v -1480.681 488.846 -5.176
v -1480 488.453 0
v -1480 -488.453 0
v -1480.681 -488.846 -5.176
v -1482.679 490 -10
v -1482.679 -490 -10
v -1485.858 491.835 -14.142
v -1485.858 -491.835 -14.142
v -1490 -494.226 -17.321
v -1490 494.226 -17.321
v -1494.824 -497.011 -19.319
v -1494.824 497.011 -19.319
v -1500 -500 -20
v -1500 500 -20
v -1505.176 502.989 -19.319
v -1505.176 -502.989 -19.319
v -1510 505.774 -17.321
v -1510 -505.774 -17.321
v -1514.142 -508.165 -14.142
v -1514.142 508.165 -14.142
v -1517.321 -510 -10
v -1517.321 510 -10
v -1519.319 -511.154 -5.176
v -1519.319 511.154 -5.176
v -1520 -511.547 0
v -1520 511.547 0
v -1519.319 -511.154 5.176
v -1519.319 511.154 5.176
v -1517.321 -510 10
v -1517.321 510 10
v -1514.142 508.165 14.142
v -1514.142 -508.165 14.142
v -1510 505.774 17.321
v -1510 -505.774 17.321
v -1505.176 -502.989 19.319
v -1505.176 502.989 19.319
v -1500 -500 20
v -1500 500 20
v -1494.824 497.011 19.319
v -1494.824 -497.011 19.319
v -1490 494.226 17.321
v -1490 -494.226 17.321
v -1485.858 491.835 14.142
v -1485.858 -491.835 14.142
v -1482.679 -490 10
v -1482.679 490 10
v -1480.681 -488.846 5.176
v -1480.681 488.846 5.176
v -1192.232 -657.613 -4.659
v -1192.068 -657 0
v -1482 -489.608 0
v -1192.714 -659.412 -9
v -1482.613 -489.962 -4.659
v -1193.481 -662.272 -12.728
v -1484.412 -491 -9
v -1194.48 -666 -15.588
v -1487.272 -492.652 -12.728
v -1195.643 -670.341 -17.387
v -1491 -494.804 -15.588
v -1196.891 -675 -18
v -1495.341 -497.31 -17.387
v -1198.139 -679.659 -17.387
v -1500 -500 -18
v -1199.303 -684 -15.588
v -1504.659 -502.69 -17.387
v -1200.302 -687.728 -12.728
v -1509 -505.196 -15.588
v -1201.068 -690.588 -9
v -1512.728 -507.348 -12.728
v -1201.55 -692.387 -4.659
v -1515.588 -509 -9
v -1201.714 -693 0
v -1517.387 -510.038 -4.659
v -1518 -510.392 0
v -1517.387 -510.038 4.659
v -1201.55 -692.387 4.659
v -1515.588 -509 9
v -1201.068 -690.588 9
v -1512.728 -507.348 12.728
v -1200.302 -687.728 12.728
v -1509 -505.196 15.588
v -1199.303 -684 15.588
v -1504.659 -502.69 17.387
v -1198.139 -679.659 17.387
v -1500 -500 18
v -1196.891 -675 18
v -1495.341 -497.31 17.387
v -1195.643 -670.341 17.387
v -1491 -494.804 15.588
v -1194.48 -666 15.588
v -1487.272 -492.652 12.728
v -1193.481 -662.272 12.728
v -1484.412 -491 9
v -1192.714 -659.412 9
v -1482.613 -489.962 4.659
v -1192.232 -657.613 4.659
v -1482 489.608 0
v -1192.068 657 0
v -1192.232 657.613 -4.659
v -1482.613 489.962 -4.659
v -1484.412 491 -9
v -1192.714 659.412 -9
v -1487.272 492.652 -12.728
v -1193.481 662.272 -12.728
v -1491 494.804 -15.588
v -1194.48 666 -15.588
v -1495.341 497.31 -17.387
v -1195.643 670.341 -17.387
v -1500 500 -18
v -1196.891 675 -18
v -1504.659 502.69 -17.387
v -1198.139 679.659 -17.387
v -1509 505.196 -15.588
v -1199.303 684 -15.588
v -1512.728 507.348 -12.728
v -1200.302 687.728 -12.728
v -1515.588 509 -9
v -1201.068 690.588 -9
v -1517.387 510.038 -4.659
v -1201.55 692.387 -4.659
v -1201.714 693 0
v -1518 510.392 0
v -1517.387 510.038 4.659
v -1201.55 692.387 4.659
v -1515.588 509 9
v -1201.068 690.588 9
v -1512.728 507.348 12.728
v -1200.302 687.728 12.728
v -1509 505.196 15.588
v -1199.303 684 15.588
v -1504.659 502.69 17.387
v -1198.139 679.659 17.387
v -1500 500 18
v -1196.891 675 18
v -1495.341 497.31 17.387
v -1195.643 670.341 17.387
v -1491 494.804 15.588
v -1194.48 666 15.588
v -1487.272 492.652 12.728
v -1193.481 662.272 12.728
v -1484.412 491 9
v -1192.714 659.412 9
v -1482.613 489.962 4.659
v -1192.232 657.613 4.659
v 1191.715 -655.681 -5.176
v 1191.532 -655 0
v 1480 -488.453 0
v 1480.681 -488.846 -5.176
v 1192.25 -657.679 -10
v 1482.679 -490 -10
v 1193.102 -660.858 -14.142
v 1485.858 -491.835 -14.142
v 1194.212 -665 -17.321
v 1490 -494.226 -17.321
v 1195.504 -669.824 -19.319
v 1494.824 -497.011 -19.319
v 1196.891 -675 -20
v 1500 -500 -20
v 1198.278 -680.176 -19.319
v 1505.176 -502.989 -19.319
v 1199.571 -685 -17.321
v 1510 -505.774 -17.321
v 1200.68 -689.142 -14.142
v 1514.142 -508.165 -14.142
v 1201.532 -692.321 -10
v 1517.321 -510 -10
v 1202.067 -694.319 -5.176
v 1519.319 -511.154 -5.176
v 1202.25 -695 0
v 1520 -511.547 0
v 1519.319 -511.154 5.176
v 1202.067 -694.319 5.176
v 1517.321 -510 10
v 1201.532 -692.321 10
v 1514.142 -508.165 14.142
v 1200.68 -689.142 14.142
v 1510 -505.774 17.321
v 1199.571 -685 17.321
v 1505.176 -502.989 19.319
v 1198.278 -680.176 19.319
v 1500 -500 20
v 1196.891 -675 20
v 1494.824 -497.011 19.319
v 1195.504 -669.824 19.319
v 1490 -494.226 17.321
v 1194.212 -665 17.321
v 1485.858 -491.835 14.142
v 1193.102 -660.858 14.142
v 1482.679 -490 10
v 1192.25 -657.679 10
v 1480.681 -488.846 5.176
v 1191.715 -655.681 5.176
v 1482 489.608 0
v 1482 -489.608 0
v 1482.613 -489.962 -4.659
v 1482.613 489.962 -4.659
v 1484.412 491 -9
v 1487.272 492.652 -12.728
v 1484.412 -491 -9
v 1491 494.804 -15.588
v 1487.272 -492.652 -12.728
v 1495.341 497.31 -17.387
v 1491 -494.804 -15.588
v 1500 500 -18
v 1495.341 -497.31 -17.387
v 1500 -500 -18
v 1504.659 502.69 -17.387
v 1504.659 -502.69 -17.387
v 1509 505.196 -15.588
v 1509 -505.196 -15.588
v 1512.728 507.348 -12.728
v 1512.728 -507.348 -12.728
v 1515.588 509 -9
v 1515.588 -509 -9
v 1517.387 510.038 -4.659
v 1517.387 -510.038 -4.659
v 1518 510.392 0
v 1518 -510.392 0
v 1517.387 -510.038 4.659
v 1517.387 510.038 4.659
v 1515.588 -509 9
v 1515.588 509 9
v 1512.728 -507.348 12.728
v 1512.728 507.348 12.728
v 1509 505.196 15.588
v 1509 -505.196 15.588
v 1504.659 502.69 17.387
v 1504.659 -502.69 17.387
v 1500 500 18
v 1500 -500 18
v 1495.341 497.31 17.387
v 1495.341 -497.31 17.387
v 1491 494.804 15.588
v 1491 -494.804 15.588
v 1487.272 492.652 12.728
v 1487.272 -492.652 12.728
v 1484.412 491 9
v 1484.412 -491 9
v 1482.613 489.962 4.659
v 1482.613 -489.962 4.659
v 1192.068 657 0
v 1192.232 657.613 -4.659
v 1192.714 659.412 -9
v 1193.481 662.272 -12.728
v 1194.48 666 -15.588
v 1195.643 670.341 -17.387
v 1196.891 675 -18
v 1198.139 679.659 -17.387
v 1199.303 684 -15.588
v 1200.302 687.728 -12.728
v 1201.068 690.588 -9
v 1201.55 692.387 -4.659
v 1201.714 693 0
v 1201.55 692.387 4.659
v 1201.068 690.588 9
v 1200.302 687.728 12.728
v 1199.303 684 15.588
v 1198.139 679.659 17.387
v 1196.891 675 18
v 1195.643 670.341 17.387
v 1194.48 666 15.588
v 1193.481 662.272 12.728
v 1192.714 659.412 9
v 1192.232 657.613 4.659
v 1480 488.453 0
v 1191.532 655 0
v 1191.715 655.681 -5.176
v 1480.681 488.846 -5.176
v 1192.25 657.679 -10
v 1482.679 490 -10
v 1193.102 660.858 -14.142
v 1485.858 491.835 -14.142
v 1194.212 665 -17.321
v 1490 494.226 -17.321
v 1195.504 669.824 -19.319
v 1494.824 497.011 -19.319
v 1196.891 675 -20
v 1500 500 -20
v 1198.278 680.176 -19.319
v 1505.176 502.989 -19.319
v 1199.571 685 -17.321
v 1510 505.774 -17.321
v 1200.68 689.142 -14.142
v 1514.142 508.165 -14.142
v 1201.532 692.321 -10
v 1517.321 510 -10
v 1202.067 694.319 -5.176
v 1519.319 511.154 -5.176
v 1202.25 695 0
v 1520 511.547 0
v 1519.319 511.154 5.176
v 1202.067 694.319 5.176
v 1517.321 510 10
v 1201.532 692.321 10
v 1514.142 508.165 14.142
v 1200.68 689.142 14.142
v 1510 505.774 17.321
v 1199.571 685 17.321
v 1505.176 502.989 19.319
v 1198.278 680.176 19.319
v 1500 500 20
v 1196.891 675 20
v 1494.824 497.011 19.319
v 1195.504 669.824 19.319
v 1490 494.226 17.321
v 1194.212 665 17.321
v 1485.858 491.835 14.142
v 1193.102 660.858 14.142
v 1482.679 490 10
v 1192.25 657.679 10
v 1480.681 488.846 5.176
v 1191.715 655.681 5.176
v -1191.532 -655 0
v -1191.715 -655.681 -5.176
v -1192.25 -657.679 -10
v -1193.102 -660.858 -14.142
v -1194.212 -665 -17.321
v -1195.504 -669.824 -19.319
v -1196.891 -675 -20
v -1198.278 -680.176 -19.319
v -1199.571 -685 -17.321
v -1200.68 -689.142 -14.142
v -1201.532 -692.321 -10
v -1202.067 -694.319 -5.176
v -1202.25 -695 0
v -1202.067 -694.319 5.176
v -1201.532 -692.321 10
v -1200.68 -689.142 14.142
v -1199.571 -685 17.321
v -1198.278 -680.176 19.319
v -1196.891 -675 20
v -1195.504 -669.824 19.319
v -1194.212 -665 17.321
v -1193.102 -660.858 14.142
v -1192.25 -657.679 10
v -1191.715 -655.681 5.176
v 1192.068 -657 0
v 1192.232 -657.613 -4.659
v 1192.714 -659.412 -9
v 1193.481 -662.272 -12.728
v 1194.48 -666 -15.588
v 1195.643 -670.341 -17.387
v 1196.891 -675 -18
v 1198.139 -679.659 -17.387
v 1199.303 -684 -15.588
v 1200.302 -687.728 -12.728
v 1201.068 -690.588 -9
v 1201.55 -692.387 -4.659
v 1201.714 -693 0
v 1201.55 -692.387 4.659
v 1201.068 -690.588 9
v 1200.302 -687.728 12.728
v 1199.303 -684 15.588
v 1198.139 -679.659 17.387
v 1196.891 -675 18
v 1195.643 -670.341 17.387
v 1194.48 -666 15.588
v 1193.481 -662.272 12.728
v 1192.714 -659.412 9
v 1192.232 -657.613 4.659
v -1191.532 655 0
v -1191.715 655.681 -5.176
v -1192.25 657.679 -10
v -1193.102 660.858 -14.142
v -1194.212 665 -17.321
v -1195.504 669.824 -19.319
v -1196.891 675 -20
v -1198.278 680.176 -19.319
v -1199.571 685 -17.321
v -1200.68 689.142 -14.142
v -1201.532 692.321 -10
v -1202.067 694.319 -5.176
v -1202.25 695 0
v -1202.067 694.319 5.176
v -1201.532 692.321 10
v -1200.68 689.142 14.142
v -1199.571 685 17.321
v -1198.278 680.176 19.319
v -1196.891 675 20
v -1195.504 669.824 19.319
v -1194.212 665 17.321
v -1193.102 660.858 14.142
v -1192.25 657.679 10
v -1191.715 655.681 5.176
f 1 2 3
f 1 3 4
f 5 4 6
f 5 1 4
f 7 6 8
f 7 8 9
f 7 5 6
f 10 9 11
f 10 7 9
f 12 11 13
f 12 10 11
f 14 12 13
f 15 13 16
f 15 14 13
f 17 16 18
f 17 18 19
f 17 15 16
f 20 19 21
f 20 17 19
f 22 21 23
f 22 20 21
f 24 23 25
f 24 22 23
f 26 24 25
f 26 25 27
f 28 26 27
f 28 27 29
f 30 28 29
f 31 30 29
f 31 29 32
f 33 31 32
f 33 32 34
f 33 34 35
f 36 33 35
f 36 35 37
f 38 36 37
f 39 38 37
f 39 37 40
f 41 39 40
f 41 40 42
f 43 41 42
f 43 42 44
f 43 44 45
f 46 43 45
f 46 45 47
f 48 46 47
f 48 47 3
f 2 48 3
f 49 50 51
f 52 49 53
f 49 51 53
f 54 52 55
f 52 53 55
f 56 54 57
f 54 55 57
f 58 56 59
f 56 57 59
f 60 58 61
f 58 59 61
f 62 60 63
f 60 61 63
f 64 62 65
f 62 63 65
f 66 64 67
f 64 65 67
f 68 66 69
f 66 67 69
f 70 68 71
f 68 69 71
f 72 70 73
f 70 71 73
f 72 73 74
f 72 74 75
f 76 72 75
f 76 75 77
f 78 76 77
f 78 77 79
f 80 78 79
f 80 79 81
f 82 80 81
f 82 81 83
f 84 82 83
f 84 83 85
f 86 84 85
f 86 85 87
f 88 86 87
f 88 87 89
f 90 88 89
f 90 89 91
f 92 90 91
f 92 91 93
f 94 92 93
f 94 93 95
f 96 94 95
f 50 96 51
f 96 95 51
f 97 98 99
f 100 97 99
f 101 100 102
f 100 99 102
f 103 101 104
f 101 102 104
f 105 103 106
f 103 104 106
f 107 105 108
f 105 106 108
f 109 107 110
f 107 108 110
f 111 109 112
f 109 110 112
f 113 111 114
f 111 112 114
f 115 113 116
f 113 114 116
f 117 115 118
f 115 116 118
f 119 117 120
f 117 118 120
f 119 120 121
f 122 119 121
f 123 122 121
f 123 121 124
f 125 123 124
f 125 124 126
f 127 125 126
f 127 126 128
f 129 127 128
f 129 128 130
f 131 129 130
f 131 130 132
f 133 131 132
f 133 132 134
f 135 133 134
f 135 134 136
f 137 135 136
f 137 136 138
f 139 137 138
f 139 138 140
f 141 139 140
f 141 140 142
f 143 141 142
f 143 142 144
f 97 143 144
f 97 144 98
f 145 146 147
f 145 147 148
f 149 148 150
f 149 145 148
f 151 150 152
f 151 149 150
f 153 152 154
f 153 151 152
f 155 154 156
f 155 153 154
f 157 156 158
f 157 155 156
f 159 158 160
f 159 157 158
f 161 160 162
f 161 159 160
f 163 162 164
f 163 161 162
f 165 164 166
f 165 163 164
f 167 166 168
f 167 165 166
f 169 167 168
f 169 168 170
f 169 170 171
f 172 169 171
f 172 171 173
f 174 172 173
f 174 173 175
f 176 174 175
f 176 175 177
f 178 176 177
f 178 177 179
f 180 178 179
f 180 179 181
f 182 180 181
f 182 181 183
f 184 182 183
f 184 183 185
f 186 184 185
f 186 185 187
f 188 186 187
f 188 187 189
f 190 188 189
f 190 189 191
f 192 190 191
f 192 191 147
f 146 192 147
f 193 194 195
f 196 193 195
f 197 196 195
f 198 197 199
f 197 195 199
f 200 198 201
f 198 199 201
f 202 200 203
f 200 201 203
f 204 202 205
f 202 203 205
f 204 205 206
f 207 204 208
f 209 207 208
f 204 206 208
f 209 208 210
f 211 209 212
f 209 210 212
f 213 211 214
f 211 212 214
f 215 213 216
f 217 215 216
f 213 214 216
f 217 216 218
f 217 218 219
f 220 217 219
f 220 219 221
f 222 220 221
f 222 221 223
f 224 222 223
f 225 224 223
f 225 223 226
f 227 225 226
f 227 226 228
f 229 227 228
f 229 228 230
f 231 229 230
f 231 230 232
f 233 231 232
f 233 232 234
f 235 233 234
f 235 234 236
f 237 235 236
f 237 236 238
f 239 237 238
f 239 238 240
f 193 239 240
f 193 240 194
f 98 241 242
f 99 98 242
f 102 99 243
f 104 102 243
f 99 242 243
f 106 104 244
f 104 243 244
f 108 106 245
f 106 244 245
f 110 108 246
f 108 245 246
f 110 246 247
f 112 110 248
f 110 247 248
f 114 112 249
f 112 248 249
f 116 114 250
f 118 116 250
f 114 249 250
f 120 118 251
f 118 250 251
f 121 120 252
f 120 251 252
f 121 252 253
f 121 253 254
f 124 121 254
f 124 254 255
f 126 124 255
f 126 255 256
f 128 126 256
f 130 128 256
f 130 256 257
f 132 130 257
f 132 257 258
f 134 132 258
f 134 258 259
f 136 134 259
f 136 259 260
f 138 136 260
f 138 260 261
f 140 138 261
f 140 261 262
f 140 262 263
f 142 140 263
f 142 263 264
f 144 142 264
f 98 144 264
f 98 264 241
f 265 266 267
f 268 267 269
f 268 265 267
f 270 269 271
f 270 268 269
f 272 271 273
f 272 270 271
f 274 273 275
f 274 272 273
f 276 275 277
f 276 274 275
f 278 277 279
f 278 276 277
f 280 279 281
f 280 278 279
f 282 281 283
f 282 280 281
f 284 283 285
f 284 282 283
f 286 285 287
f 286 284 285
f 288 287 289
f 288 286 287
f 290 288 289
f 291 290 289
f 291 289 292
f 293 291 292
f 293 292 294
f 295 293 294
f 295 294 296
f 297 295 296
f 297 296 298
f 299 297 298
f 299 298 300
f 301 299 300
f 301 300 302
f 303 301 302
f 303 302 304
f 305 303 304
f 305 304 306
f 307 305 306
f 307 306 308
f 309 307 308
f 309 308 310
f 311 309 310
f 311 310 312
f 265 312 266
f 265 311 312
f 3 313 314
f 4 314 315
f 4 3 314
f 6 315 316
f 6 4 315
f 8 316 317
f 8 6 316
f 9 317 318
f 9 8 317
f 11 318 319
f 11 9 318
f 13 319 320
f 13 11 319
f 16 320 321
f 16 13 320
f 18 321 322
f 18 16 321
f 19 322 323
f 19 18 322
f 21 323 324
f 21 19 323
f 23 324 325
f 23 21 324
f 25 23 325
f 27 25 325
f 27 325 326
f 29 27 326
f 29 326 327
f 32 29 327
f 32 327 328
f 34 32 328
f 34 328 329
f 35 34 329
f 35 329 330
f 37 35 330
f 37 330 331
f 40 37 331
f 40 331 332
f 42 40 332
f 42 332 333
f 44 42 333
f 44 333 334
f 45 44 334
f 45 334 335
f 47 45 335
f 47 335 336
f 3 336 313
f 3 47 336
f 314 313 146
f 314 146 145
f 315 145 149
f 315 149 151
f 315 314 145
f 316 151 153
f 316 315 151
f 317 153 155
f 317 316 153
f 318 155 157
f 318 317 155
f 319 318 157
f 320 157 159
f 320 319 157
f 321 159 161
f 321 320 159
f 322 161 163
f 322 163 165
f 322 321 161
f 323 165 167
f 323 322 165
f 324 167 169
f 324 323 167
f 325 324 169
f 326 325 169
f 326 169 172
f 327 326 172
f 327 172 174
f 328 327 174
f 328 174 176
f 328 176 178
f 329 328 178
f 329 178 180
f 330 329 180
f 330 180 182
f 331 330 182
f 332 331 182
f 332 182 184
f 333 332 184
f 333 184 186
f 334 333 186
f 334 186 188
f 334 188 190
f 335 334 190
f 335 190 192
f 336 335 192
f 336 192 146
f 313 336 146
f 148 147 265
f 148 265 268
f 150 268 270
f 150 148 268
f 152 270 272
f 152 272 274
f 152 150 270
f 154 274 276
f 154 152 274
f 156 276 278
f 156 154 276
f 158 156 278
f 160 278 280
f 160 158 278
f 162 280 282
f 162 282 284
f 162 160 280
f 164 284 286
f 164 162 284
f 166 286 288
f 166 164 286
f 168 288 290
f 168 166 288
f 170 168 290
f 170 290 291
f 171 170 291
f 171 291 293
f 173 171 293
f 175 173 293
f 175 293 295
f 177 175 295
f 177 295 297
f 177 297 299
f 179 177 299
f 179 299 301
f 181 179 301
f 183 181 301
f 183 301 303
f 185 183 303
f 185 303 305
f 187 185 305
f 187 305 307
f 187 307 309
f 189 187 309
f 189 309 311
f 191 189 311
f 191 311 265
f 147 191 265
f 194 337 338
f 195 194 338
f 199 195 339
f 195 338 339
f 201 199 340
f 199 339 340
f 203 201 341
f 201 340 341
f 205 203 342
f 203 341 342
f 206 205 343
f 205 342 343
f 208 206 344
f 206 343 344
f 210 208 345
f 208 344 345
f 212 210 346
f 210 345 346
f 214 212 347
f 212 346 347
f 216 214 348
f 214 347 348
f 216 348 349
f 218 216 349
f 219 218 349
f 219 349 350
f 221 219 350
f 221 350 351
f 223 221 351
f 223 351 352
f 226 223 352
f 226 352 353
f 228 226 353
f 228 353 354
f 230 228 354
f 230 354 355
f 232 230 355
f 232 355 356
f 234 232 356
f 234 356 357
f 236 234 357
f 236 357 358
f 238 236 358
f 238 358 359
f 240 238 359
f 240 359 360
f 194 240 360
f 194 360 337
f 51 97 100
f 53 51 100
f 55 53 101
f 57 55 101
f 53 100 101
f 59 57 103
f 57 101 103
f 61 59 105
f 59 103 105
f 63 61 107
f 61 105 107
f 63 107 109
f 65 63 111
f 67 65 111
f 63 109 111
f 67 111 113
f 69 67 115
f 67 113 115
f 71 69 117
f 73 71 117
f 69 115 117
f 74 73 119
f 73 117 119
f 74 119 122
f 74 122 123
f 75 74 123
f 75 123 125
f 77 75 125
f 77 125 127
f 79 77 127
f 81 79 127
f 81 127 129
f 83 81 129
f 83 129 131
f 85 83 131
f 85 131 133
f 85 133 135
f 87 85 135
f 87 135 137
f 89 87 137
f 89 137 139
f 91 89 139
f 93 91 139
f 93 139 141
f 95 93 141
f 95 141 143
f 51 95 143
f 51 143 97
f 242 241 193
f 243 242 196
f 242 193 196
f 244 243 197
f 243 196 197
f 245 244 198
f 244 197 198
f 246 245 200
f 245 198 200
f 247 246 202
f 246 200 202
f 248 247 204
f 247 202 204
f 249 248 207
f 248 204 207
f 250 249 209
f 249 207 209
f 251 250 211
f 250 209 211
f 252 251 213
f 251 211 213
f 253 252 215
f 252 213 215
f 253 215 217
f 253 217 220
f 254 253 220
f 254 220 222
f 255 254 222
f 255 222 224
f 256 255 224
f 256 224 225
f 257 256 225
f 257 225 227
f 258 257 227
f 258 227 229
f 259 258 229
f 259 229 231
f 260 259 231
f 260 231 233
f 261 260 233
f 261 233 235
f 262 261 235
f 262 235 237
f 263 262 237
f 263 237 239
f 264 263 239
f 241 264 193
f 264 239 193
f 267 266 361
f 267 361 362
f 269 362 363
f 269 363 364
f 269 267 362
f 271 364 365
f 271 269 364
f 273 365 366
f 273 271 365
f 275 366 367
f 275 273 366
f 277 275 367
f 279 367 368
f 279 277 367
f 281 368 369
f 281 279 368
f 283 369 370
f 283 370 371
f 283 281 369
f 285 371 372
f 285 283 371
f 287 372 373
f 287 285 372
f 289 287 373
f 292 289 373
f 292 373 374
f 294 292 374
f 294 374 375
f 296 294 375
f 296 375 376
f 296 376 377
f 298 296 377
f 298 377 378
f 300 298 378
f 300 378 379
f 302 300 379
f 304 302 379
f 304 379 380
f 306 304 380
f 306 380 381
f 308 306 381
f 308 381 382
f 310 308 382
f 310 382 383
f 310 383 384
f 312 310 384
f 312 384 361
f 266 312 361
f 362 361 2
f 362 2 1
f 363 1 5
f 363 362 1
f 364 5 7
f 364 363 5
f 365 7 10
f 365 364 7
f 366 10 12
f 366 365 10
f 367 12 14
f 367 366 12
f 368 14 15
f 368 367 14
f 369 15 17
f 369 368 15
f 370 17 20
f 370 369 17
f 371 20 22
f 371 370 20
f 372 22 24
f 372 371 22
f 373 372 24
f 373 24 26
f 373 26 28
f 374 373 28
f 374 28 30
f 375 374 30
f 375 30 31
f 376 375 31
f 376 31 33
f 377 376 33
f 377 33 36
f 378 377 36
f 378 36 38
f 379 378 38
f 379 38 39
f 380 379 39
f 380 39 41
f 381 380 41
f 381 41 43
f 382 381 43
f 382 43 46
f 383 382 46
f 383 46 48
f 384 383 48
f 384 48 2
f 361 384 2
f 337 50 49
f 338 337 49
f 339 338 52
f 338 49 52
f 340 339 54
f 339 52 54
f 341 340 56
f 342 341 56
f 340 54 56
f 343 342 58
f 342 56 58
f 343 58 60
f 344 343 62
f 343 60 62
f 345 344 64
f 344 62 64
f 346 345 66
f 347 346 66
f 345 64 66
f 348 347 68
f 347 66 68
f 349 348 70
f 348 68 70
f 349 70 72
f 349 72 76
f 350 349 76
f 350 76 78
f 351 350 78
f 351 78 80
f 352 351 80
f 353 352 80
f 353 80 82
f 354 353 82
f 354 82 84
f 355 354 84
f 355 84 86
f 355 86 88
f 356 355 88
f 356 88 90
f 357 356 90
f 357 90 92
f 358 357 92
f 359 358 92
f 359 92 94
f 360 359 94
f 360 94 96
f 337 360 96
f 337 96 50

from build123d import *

# Parameters (mm, degrees)
F1_R   = 20
F1_R_2 = 18


with BuildPart() as f2:
    # F2: sweep along a path in F0
    with BuildLine(Plane.XY) as f2_path:
        Line((-1500, 0), (-1500, 500))
        Line((-1500, 500), (-1196.8911086754, 675))
        Line((-1196.8911086754, 675), (1196.8911086754, 675))
        Line((1196.8911086754, 675), (1500, 500))
        Line((1500, 500), (1500, 0))
        Line((1500, 0), (1500, -500))
        Line((1500, -500), (1196.8911086754, -675))
        Line((1196.8911086754, -675), (-1196.8911086754, -675))
        Line((-1196.8911086754, -675), (-1500, -500))
        Line((-1500, -500), (-1500, 0))
    # F1 (on Front) → F2 (sweep)
    with BuildSketch(Plane.XZ):
        with Locations((-1500, 0)):
            Circle(F1_R)
        with Locations((-1500, 0)):
            Circle(F1_R_2, mode=Mode.SUBTRACT)
    sweep(path=f2_path.line, transition=Transition.RIGHT)


solid = f2.part
